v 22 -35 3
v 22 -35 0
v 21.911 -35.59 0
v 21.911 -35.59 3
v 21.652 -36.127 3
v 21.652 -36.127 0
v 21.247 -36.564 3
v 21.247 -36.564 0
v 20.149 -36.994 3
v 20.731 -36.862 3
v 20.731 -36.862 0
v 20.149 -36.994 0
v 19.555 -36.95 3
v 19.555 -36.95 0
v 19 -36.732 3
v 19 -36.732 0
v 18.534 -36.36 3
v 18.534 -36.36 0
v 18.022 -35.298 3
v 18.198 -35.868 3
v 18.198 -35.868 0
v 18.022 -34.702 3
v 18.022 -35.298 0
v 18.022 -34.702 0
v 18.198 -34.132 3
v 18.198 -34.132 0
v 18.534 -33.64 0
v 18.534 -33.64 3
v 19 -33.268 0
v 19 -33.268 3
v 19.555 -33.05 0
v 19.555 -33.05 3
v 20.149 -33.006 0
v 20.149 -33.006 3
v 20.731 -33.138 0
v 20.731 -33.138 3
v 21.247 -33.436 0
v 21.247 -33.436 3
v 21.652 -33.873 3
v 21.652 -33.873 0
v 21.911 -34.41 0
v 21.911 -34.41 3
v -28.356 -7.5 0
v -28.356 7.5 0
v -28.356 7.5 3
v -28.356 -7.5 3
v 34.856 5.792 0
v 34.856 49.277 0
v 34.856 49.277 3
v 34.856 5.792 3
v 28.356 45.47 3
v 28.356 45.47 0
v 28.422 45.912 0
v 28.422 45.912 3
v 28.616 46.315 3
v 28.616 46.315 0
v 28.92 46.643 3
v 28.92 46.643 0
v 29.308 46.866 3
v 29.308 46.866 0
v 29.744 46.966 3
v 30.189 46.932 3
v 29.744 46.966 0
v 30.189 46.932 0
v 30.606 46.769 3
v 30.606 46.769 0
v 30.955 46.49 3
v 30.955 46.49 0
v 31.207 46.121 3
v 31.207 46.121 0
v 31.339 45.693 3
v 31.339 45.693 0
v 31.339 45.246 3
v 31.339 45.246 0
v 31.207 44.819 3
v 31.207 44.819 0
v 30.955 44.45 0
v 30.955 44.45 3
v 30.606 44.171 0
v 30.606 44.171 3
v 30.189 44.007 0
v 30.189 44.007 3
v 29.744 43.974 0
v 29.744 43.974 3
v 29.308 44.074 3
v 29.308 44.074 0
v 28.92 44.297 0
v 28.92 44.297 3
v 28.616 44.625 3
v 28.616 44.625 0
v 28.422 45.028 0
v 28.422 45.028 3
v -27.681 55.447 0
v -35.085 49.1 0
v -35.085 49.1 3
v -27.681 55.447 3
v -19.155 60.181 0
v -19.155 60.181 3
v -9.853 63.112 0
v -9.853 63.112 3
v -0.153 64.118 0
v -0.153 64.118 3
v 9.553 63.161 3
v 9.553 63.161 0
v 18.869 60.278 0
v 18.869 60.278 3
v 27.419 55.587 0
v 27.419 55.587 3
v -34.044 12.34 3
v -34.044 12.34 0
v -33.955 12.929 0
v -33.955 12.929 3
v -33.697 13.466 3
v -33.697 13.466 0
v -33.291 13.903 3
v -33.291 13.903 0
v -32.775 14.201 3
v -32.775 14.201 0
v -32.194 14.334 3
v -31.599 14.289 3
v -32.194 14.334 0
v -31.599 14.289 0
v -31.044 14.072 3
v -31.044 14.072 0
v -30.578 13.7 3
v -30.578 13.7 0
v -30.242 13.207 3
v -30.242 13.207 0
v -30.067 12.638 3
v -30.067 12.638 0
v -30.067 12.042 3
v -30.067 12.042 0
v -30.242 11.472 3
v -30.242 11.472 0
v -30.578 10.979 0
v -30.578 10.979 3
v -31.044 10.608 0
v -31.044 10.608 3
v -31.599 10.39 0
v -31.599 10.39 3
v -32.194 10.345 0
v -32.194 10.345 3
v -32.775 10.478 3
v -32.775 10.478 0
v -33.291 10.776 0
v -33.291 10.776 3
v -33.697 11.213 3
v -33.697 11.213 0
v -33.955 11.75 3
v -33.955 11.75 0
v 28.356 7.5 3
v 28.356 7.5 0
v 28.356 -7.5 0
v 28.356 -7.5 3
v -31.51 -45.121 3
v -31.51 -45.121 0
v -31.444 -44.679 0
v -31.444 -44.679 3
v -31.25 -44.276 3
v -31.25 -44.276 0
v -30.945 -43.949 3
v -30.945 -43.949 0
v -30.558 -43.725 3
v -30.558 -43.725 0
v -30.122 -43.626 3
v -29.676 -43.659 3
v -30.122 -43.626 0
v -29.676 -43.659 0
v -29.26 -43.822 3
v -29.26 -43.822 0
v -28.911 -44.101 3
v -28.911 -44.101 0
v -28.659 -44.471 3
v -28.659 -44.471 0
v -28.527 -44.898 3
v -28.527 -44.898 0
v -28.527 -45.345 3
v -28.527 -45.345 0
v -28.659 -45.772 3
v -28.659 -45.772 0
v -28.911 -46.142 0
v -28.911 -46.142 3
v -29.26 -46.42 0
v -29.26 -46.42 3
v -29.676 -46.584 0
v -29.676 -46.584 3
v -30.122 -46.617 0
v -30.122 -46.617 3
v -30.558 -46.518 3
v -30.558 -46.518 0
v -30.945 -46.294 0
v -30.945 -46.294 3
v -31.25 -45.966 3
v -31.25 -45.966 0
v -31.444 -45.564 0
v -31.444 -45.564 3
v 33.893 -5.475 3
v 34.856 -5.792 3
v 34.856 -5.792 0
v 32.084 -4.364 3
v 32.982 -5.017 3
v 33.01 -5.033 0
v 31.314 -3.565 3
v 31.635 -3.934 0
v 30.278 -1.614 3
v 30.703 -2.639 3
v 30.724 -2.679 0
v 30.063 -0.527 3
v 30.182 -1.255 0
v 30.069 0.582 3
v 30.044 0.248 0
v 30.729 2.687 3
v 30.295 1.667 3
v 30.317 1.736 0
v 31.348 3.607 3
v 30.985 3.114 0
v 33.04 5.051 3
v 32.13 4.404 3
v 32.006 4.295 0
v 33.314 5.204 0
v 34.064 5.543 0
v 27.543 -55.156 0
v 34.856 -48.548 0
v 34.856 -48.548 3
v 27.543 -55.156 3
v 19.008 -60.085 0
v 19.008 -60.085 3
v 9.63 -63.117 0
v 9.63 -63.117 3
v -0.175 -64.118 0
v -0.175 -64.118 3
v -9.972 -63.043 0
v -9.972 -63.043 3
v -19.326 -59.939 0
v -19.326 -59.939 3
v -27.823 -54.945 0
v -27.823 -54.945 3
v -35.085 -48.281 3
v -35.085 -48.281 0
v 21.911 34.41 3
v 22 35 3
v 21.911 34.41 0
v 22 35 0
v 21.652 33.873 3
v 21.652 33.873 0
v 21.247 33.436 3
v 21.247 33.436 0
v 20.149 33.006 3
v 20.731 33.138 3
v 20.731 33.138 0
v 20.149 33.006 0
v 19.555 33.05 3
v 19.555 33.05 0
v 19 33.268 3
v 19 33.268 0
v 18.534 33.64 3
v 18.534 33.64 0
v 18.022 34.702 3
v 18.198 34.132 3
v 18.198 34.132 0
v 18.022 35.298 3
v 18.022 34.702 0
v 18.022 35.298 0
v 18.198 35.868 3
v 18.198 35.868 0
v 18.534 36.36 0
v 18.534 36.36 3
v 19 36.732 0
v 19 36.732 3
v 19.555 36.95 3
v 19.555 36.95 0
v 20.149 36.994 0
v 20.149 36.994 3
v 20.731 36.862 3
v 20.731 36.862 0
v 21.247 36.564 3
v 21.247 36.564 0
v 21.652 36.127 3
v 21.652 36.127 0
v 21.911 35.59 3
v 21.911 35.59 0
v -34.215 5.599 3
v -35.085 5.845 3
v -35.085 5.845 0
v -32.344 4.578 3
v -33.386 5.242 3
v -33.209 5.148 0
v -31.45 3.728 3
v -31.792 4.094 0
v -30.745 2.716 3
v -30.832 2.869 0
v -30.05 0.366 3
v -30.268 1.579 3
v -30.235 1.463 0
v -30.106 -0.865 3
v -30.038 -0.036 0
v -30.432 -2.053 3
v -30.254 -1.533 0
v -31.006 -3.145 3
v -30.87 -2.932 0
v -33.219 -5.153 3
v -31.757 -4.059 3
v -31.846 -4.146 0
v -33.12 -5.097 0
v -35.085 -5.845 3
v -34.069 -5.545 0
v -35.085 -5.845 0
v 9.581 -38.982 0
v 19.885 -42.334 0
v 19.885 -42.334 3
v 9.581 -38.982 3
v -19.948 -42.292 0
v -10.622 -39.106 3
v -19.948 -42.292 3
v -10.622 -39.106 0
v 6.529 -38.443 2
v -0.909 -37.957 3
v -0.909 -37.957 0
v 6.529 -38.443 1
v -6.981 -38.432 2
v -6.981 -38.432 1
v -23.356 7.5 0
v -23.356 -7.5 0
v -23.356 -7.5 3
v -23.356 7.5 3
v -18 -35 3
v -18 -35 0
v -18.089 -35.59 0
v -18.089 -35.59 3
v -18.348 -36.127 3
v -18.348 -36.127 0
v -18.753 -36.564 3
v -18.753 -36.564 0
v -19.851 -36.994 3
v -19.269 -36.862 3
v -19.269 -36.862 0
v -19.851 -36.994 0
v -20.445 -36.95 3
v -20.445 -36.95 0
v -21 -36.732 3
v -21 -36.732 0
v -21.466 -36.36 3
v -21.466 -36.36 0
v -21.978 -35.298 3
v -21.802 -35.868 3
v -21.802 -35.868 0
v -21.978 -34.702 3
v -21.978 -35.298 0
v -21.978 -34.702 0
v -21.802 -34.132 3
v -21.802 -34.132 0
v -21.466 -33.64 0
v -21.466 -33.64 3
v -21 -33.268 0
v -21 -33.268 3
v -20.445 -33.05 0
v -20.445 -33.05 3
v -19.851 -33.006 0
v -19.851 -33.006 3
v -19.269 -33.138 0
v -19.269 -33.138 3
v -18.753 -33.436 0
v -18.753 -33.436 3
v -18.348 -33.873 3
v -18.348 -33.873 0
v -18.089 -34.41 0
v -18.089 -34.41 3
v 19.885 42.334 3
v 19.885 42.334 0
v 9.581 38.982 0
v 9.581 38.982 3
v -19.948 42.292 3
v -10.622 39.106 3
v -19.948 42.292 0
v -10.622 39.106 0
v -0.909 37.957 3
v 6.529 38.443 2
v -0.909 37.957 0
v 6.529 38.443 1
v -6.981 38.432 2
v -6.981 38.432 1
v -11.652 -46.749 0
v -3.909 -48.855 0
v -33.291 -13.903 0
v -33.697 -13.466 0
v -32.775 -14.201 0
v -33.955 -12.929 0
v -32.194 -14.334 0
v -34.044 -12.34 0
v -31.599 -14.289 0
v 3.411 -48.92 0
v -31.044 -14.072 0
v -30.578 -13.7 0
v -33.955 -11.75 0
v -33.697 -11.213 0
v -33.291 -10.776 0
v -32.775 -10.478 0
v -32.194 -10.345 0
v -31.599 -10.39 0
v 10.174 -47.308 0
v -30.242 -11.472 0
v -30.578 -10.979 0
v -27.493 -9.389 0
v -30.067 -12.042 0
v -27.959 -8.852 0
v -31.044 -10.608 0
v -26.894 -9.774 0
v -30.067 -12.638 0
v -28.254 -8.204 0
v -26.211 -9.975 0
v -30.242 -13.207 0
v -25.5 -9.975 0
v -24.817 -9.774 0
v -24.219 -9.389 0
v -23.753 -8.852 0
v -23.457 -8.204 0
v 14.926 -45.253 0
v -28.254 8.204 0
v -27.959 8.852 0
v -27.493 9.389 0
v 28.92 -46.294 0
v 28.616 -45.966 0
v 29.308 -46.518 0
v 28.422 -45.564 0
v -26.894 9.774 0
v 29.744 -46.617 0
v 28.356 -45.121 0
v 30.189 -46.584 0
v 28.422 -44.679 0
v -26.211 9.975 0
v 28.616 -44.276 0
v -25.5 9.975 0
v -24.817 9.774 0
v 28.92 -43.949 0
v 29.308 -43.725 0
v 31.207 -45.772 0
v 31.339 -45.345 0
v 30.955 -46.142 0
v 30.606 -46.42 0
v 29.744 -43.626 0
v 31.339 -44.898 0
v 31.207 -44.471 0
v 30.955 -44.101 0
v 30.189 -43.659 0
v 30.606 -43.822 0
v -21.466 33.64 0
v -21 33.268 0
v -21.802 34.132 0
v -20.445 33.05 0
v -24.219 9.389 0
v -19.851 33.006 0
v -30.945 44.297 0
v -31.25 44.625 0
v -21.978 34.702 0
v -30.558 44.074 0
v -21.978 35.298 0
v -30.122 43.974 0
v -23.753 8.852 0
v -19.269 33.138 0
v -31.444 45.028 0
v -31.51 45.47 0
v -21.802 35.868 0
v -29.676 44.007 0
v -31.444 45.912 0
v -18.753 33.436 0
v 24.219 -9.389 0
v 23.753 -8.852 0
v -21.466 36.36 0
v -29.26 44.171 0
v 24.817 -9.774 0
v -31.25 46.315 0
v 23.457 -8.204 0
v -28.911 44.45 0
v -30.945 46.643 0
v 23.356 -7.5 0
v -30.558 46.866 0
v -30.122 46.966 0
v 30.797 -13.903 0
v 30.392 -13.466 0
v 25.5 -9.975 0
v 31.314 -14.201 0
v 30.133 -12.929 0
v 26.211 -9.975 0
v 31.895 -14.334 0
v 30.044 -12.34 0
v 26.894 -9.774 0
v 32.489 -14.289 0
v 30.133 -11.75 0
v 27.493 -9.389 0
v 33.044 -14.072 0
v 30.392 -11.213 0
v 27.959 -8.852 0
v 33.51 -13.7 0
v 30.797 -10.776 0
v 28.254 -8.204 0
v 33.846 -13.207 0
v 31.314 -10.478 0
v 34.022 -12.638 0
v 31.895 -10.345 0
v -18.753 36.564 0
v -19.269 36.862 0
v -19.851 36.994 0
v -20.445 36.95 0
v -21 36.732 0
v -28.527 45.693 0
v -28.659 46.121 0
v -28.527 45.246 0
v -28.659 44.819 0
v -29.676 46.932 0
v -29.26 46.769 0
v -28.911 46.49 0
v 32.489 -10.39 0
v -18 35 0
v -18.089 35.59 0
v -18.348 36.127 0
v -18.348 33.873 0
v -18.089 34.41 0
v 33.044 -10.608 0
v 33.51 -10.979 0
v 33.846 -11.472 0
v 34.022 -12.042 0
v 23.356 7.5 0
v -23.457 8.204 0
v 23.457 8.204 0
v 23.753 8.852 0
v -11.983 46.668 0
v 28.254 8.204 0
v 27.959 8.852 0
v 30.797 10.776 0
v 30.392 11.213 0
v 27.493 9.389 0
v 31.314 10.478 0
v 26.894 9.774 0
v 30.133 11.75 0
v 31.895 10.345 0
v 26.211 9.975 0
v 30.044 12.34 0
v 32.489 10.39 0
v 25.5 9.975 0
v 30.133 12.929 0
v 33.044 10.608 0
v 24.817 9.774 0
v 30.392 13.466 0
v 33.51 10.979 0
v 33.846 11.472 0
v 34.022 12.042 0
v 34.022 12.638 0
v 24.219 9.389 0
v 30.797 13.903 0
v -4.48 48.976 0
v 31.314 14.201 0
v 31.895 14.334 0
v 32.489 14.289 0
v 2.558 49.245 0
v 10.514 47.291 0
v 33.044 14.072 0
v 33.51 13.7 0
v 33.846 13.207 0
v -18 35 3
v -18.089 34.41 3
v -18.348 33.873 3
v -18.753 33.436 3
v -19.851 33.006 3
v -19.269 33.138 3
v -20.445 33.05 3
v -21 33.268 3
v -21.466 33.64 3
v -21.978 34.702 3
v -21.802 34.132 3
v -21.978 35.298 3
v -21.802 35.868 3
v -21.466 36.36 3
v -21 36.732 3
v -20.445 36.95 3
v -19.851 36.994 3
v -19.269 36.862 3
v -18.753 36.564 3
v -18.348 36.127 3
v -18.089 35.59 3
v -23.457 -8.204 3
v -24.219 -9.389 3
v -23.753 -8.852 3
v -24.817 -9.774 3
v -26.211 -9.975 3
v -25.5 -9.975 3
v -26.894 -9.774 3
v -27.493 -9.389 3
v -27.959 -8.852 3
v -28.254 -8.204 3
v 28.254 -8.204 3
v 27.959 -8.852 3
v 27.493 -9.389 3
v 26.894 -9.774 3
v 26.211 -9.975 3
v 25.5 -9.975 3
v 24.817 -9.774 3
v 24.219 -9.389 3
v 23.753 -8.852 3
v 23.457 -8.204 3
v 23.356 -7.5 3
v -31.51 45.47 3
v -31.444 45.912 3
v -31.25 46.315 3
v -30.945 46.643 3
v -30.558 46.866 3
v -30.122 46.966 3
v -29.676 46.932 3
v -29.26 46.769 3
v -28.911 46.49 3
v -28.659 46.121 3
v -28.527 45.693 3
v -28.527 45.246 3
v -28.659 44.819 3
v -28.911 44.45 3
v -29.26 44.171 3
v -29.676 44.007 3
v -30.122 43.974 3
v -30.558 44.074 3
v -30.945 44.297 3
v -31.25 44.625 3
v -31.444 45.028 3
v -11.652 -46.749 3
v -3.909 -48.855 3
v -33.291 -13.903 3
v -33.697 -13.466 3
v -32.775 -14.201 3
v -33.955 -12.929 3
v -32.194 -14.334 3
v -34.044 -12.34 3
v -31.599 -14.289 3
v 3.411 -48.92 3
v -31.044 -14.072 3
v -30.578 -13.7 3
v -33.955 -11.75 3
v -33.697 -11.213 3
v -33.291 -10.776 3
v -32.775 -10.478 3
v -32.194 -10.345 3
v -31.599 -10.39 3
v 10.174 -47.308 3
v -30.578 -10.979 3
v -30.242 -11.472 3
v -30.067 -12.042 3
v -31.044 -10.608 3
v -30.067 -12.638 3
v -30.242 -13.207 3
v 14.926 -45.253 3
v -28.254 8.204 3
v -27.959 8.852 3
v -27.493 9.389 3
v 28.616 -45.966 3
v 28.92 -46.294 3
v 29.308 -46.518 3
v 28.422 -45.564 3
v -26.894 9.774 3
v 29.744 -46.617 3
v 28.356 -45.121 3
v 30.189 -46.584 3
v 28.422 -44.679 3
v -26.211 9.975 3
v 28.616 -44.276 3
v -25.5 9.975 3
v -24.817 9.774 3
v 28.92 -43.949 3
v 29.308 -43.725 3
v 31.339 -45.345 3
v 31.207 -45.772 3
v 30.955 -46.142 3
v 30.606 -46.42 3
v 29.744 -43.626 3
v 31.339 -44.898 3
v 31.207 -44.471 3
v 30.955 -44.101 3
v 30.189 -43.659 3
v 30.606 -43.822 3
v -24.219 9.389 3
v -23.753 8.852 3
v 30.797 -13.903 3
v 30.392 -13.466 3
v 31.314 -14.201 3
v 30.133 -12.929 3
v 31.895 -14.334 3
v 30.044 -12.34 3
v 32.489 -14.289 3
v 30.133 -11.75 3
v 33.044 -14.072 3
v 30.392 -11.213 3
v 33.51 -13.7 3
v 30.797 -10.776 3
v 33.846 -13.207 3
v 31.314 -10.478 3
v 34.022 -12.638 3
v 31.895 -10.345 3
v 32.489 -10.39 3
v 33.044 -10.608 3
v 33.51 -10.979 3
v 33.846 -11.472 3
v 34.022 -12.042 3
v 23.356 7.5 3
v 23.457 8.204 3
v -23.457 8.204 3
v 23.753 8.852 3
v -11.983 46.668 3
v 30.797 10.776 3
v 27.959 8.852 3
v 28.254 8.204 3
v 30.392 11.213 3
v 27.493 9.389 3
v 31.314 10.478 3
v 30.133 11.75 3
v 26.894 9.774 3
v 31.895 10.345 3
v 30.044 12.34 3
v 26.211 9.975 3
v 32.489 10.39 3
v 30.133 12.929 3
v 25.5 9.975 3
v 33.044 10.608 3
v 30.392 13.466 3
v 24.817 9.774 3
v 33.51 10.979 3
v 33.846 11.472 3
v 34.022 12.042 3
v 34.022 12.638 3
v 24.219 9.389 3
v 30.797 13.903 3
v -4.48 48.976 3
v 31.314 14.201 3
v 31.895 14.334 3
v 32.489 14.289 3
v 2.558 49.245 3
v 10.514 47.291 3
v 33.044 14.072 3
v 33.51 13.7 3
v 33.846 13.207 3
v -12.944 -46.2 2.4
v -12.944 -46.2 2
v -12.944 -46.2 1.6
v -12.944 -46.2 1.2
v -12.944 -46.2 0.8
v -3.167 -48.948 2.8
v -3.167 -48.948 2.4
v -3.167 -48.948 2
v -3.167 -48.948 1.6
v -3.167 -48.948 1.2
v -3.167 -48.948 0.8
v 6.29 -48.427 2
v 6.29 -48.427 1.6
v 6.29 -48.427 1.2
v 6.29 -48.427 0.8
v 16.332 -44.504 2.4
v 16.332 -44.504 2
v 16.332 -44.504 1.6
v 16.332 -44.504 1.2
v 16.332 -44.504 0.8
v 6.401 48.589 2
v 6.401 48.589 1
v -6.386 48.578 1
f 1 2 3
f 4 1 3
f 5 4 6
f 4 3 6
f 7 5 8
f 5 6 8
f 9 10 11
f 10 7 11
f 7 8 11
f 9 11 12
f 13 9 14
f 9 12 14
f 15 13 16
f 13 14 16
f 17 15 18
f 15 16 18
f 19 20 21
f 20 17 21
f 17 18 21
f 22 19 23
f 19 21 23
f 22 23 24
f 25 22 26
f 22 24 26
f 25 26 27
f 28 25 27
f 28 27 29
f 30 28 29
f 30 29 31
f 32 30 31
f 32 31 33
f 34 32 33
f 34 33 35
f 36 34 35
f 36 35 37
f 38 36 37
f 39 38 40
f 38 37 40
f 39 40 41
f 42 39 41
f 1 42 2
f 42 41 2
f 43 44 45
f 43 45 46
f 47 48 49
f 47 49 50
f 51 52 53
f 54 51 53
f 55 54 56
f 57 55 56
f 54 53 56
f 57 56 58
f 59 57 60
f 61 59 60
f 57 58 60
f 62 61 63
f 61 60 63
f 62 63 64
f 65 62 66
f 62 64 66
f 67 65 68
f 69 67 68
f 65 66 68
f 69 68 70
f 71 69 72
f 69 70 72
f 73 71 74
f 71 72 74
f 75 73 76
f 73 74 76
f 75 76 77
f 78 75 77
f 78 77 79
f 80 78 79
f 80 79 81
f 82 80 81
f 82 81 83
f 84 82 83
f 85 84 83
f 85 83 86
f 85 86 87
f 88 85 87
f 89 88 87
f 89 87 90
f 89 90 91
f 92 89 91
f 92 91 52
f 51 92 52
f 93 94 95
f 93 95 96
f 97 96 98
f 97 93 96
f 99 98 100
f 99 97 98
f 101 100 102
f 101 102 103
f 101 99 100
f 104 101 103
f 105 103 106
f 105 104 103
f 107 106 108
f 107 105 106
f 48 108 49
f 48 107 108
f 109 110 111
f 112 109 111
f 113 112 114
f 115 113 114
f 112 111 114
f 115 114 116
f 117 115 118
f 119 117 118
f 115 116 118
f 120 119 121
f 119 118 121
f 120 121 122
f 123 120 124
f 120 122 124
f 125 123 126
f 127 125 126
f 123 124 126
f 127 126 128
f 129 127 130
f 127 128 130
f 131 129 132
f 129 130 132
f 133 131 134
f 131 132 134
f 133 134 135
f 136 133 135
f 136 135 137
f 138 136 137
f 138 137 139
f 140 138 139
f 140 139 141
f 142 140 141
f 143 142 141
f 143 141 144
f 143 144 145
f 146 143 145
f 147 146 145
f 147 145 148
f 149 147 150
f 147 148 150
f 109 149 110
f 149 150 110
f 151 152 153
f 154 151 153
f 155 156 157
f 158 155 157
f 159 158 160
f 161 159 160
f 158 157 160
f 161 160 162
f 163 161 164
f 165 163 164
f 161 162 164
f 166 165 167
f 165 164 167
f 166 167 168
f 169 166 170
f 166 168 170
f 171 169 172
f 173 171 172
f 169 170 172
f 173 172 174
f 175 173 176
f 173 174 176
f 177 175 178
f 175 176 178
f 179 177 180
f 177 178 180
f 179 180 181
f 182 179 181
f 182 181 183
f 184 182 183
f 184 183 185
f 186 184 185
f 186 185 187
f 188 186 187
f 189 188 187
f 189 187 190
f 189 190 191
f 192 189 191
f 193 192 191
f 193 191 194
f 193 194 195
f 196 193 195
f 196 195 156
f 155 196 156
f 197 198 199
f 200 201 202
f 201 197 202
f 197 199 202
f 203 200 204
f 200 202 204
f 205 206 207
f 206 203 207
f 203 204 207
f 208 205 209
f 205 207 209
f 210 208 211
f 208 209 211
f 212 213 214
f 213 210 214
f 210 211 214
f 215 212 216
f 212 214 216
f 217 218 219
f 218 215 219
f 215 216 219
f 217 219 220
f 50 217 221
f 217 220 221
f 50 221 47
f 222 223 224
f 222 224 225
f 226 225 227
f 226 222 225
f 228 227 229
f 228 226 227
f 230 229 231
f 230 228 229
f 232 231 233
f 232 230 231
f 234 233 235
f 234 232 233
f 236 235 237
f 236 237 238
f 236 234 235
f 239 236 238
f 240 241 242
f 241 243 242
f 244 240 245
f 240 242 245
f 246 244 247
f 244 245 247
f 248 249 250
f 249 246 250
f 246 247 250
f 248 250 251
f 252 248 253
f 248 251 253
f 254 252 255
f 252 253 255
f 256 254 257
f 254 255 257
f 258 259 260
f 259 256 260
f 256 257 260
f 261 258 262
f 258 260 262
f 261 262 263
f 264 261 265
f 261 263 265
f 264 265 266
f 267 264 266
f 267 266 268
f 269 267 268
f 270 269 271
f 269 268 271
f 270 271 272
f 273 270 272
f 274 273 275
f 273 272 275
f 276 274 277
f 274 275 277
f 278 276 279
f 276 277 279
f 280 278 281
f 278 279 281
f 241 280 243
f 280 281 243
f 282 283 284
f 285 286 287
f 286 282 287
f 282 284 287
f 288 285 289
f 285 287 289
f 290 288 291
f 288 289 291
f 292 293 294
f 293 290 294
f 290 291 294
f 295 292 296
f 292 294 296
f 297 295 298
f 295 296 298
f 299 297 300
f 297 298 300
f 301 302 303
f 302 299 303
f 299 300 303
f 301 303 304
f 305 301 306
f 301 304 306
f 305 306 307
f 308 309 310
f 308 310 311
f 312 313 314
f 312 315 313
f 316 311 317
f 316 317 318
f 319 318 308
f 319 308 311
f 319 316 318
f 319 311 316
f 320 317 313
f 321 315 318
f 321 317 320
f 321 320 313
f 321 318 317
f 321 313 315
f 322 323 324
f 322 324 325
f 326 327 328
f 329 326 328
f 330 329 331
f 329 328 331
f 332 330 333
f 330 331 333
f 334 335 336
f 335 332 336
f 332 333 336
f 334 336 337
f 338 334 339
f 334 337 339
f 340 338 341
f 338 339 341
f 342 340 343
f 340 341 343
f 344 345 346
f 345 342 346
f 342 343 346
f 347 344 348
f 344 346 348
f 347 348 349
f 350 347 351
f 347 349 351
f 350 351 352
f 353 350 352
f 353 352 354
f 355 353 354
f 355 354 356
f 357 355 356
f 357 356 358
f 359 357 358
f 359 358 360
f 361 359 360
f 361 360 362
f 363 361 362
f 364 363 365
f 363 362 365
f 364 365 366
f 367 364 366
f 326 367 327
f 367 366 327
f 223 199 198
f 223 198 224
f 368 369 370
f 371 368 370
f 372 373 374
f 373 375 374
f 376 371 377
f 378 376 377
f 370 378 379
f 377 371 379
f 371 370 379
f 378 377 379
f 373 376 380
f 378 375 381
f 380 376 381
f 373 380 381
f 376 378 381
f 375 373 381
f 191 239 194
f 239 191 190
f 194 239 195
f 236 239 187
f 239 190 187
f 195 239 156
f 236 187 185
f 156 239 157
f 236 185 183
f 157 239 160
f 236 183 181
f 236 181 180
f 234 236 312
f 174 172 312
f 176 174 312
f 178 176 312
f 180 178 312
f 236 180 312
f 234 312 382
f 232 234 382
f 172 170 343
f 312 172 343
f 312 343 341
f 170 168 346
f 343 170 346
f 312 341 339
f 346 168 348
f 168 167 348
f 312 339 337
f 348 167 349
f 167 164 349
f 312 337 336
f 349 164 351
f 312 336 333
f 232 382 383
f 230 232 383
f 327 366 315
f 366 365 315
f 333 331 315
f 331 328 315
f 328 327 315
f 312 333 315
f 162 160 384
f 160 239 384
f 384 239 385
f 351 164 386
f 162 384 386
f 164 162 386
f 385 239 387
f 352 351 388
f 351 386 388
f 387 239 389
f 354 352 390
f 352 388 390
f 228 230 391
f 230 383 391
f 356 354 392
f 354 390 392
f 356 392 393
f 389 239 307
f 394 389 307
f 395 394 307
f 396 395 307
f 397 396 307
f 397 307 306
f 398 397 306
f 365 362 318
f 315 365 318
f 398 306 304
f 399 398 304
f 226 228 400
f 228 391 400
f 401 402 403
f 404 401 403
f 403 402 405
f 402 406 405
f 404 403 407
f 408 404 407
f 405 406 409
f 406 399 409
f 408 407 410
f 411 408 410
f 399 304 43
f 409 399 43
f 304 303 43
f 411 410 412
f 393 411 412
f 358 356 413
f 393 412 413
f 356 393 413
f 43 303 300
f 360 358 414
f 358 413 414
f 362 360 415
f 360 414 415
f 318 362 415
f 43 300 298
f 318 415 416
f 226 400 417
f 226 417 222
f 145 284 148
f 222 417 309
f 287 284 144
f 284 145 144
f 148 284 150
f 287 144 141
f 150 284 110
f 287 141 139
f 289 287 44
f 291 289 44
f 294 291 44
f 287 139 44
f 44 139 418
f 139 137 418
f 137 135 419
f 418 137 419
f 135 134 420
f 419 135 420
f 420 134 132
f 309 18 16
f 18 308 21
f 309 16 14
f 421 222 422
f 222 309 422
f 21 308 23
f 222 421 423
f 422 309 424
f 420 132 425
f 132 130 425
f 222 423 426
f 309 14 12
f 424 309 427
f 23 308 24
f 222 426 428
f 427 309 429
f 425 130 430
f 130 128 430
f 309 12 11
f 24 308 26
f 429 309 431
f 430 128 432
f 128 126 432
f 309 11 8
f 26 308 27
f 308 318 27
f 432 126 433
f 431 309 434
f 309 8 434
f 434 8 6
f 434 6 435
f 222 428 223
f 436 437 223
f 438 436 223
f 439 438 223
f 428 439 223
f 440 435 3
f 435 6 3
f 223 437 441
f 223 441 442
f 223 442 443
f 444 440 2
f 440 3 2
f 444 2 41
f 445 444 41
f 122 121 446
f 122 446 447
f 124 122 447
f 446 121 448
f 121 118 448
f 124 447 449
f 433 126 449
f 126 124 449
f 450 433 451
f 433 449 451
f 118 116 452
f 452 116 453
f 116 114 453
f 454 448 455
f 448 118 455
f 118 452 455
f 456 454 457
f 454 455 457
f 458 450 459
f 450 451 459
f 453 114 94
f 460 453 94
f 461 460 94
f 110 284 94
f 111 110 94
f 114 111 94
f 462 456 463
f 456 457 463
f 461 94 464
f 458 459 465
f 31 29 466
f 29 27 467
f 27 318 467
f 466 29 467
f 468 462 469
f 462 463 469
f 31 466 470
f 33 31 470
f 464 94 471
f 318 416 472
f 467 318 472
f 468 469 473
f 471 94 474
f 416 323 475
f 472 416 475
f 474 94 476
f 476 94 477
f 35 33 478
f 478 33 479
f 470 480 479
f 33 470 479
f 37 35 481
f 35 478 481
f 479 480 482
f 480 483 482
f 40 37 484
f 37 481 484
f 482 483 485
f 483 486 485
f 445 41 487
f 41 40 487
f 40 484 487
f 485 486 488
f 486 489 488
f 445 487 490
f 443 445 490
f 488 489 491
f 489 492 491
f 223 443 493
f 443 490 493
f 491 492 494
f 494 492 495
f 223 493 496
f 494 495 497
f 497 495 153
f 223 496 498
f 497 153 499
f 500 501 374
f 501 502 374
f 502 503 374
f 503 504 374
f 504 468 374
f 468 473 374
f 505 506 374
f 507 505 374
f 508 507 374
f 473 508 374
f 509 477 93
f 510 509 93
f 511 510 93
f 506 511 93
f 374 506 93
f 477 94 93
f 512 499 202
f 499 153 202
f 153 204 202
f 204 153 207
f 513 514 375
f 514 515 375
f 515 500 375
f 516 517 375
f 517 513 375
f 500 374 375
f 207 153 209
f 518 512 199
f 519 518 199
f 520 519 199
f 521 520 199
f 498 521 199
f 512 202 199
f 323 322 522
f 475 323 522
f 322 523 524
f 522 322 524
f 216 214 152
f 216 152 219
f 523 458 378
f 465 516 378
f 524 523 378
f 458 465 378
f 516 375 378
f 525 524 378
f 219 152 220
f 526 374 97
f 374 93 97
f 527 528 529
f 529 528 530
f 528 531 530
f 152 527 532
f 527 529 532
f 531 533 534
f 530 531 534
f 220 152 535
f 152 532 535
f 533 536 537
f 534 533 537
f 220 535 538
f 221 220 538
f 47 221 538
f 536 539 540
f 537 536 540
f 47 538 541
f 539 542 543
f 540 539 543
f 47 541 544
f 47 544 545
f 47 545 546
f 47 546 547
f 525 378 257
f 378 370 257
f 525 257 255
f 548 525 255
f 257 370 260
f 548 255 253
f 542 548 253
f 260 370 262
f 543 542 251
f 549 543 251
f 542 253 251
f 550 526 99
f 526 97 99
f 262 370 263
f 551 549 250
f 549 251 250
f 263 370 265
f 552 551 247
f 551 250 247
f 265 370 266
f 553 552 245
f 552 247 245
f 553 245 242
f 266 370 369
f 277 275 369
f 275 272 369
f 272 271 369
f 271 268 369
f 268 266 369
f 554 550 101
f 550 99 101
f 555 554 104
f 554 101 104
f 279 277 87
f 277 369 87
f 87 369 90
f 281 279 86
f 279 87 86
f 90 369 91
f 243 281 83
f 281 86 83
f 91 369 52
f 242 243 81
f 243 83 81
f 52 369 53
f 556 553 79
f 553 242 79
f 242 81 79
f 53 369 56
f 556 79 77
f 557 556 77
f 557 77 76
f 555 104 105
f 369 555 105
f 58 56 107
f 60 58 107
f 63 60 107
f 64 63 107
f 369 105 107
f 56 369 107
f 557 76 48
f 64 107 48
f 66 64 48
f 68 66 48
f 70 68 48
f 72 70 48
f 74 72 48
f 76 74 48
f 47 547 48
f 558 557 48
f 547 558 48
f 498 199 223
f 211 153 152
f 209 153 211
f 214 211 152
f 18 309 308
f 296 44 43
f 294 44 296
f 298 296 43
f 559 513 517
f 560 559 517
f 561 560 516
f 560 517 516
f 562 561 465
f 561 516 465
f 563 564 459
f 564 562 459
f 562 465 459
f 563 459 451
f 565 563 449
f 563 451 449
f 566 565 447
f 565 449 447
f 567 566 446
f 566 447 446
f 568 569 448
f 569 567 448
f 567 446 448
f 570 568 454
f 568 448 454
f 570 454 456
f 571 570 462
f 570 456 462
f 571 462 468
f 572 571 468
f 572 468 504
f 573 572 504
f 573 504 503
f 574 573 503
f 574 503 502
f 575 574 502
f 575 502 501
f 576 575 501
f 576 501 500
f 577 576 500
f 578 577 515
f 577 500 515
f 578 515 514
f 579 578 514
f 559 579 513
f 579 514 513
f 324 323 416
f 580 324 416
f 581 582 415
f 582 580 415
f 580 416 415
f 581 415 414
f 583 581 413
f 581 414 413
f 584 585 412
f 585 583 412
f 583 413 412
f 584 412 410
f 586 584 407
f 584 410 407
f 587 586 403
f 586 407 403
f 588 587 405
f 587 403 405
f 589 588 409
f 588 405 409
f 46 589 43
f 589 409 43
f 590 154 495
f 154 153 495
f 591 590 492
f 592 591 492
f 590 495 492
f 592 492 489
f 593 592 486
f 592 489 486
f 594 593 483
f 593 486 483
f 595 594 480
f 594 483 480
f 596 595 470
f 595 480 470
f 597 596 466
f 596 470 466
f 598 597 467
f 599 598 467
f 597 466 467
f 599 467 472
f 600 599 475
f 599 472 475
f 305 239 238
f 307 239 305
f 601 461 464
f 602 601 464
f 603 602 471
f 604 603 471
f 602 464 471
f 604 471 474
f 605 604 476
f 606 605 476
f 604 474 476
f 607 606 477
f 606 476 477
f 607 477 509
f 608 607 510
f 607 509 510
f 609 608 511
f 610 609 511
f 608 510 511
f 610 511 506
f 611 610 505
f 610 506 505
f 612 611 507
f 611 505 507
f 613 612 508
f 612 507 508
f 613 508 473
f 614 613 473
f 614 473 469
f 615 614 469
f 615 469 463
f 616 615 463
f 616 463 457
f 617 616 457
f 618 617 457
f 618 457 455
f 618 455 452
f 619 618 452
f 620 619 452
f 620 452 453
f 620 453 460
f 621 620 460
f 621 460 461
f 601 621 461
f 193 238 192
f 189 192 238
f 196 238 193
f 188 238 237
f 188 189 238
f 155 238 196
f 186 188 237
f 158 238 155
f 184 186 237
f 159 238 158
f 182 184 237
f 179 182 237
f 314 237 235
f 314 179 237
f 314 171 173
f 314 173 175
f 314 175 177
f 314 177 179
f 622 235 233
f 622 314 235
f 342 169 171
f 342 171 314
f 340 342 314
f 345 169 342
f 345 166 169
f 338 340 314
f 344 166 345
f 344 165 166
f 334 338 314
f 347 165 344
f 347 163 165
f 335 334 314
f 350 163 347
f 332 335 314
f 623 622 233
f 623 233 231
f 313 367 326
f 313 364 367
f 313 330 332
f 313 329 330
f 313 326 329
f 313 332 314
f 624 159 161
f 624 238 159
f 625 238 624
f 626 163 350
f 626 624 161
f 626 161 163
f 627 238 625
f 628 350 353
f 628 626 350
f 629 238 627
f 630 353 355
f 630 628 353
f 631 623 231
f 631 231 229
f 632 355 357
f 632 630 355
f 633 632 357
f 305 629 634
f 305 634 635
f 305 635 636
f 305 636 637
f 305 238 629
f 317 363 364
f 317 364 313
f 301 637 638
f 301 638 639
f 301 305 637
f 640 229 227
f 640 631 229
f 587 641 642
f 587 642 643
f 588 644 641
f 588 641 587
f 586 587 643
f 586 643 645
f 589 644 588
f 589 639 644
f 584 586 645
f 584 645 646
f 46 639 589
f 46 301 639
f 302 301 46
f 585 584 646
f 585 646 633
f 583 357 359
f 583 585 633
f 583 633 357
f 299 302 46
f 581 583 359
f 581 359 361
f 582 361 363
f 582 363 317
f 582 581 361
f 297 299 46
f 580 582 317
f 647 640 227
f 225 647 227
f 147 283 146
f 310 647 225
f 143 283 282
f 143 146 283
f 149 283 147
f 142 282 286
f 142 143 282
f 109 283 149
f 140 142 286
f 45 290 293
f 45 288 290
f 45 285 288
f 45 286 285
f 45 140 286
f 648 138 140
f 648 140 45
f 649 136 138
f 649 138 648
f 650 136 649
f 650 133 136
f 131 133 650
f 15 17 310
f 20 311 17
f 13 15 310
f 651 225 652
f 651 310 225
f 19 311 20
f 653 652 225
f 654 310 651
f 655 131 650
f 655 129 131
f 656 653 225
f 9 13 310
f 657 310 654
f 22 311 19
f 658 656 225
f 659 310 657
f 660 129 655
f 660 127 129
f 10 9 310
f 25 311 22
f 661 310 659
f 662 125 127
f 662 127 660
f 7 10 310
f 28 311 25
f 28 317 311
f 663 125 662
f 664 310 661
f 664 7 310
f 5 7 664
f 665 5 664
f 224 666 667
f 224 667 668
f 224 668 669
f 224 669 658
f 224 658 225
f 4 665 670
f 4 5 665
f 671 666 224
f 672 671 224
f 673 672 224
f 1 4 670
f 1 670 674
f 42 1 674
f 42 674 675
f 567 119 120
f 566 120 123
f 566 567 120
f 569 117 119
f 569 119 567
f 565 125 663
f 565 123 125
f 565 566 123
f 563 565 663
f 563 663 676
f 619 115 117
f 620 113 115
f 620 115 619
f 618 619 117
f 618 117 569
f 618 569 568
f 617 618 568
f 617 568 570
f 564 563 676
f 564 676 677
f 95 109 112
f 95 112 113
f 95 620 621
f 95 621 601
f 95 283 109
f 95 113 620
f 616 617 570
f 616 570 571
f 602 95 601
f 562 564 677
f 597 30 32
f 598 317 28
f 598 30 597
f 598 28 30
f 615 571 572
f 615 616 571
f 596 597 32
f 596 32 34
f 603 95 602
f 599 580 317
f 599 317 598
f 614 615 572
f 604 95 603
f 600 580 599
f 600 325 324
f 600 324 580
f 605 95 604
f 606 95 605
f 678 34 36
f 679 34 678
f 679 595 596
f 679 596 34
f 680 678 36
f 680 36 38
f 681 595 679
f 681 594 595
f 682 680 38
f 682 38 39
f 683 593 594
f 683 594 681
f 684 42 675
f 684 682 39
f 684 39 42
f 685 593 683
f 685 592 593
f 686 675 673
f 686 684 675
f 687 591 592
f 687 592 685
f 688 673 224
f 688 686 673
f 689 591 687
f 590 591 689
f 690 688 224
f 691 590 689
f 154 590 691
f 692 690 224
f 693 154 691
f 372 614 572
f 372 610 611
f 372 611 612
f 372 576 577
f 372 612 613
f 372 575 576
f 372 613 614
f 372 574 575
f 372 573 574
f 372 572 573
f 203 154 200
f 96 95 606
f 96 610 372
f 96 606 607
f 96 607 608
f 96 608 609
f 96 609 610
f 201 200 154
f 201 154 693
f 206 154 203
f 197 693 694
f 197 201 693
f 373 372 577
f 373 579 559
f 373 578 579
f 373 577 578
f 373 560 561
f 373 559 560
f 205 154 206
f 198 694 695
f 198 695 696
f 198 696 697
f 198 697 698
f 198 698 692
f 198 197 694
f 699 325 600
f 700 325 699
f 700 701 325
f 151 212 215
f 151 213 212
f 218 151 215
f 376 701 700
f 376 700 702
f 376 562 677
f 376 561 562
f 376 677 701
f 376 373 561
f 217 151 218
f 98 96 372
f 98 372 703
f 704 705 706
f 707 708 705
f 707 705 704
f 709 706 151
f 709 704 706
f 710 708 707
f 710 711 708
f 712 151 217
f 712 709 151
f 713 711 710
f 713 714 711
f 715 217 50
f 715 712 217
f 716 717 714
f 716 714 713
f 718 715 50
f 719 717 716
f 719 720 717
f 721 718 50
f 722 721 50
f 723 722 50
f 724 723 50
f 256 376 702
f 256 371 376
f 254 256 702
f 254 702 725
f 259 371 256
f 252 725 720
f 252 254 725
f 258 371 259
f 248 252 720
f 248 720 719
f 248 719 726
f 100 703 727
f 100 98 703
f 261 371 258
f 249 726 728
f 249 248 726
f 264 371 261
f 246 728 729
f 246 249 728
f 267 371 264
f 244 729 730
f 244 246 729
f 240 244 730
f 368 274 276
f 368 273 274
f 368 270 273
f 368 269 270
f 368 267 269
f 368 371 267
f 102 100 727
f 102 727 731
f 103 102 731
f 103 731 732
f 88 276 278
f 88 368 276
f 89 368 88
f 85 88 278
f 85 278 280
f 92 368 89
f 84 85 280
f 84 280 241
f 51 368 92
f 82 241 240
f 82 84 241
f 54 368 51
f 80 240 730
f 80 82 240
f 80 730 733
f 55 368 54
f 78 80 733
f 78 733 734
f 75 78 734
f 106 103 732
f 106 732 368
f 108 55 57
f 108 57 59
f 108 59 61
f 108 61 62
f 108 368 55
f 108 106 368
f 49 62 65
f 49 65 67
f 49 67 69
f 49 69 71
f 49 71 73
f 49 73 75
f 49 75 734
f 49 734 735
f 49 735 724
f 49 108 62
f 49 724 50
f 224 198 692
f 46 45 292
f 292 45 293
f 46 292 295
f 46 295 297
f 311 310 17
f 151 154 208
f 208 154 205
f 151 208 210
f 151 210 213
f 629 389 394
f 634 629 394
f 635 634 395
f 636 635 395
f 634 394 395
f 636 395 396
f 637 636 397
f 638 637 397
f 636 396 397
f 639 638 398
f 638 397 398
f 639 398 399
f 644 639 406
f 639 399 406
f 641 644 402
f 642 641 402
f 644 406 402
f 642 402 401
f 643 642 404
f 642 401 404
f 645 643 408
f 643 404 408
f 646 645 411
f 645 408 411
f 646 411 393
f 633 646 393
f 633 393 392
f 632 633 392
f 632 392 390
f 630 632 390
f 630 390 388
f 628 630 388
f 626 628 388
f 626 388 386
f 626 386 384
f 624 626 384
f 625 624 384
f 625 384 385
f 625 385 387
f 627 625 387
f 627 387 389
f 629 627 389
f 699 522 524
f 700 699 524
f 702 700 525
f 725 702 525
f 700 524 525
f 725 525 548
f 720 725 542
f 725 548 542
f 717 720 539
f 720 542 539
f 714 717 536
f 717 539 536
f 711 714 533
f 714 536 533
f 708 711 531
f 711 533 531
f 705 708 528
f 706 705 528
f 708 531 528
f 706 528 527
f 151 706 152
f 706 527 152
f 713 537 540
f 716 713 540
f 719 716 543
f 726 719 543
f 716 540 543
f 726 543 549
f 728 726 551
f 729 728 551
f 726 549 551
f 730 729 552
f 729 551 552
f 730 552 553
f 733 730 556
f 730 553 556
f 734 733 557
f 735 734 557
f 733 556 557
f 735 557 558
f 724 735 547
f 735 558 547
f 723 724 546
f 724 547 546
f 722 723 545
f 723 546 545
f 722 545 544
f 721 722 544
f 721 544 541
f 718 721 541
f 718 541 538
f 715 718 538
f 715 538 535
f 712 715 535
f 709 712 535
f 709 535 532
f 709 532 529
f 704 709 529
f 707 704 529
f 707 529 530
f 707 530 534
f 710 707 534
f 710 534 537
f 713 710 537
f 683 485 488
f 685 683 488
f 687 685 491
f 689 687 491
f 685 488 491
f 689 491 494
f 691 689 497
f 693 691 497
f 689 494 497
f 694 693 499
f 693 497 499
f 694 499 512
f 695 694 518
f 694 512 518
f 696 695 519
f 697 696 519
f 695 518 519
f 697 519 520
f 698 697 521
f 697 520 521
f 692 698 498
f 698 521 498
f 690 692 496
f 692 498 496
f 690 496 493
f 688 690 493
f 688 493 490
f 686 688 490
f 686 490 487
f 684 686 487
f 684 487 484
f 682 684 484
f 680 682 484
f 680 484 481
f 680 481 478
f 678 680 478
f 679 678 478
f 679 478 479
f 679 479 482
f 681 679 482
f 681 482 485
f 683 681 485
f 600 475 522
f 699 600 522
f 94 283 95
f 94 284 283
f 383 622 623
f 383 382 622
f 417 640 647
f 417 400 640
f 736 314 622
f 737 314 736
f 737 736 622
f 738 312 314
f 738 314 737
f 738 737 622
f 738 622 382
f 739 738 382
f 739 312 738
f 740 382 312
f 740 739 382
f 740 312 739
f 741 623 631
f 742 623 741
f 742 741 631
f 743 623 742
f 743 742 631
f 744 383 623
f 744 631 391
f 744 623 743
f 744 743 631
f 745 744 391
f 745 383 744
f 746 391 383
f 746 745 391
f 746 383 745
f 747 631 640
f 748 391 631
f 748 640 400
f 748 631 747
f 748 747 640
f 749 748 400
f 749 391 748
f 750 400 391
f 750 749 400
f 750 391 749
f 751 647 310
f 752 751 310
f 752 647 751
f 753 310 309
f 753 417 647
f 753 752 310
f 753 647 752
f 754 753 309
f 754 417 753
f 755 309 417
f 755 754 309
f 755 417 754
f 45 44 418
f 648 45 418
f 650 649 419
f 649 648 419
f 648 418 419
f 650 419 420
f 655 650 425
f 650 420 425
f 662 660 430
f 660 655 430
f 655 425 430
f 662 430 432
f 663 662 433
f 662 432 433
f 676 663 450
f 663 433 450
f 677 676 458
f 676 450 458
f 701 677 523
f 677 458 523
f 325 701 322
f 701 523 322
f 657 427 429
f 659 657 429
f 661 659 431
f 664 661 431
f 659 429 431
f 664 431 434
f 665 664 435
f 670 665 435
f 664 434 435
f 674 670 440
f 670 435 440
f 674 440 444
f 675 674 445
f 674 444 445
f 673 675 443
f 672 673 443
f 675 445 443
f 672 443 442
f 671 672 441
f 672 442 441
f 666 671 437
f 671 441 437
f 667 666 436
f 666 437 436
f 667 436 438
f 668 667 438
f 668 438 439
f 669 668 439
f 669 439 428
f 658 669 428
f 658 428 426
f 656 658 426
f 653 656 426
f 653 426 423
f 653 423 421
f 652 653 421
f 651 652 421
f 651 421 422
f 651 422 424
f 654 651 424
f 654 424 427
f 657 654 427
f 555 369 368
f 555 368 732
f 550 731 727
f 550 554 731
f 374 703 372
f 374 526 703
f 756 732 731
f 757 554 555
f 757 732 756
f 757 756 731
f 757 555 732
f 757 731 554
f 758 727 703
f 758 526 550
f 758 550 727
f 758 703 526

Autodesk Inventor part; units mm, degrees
ref_plane "YZ Plane" through (0, 0, 0) normal (1, 0, 0) x (0, 1, 0)
ref_plane "XZ Plane" through (0, 0, 0) normal (0, 1, 0) x (-1, 0, 0)
ref_plane "XY Plane" through (0, 0, 0) normal (0, 0, 1) x (1, 0, 0)
ref_plane "Płaszczyzna konstrukcyjna1" through (0, 0, 0) normal (0, 0, 1) x (1, 0, 0)
sketch "Szkic1" plane through (0, 0, 0) normal (0, 0, 1) x (1, 0, 0)
  line L0 (-16.5, -47.5) -> (-16.5, 50.5) construction
  line L1 (16.5, -47.5) -> (-16.5, -47.5)
  line L2 (16.5, 50.5) -> (16.5, -47.5) construction
  line L3 (-16.5, 50.5) -> (16.5, 50.5)
  spline S0 degree 3 poles (-35.085094, 0.350302) (-65.123445, -45.85666) (-107.677174, -89.186977) (-160.871239, -134.245964) (-163.540213, -136.506767) (-166.235706, -138.77176) (-168.958028, -141.042) knots 1.00684263 1.00684263 1.00684263 1.00684263 1.95254981 1.95254981 1.95254981 2 2 2 2 construction
  spline S1 degree 3 poles (-168.958035, -141.042006) (-174.842969, -145.949681) (-180.021392, -152.120463) (-183.430993, -158.400223) (-185.92467, -162.993046) (-187.5096, -167.629248) (-187.777285, -172.0593) (-187.941661, -174.779633) (-187.597345, -177.457906) (-186.533873, -179.887417) (-185.566044, -182.098431) (-183.960403, -184.06029) (-181.944828, -185.409391) (-179.841126, -186.817479) (-177.370046, -187.557326) (-174.842104, -187.757319) (-170.645821, -188.089298) (-166.2165, -187.039461) (-161.759498, -185.081578) (-154.903003, -182.06964) (-147.956172, -176.775816) (-142.375954, -170.505914) (-141.930799, -170.005741) (-141.494091, -169.499252) (-141.067481, -168.988346) knots -1.74995257 -1.74995257 -1.74995257 -1.74995257 -1.03595782 -1.03595782 -1.03595782 -0.51376401 -0.51376401 -0.51376401 -0.19310387 -0.19310387 -0.19310387 0.09871784 0.09871784 0.09871784 0.4032988 0.4032988 0.4032988 0.90889088 0.90889088 0.90889088 1.68667586 1.68667586 1.68667586 1.74872267 1.74872267 1.74872267 1.74872267
  spline S2 degree 3 poles (-141.067481, -168.988346) (-116.712468, -140.68912) (-93.293894, -114.867026) (-73.367362, -94.342192) (-61.6586, -82.28187) (-51.151132, -72.048223) (-42.412496, -64.246161) (-37.627468, -59.973975) (-33.366948, -56.428021) (-29.779492, -53.735847) knots 1.1712815 1.1712815 1.1712815 1.1712815 1.58557053 1.58557053 1.58557053 1.82900535 1.82900535 1.82900535 1.96230333 1.96230333 1.96230333 1.96230333
  spline S3 degree 3 poles (-29.779492, -53.735847) (-23.002213, -58.511561) (-16.053637, -61.720133) (-8.95639, -63.196051) (-1.235829, -64.801593) (6.619932, -64.303417) (14.26492, -61.76241) (19.532027, -60.011752) (24.701042, -57.314346) (29.778619, -53.736463) knots 1.04774904 1.04774904 1.04774904 1.04774904 1.36653444 1.36653444 1.36653444 1.71331713 1.71331713 1.71331713 1.95223726 1.95223726 1.95223726 1.95223726
  spline S4 degree 3 poles (29.778619, -53.736463) (34.571432, -57.320947) (40.566429, -62.365096) (47.432495, -68.614281) (65.987099, -85.501849) (90.98262, -111.228833) (117.881656, -141.881406) (125.48107, -150.541255) (133.234406, -159.595591) (141.042009, -168.957931) knots 1.23044004 1.23044004 1.23044004 1.23044004 1.40276207 1.40276207 1.40276207 1.86843878 1.86843878 1.86843878 2 2 2 2
  spline S5 degree 3 poles (141.042009, -168.957931) (145.94969, -174.842884) (152.120487, -180.021325) (158.400263, -183.430935) (162.993086, -185.924612) (167.629288, -187.509541) (172.05934, -187.777227) (174.779673, -187.941603) (177.457946, -187.597287) (179.887458, -186.533815) (182.098472, -185.565985) (184.06033, -183.960345) (185.409431, -181.94477) (186.817519, -179.841068) (187.557366, -177.369988) (187.757359, -174.842045) (188.089339, -170.645763) (187.039501, -166.216442) (185.081618, -161.75944) (182.069681, -154.902945) (176.775856, -147.956114) (170.505954, -142.375896) (169.995852, -141.921904) (169.479183, -141.4767) (168.957931, -141.042009) knots -1.7499544 -1.7499544 -1.7499544 -1.7499544 -1.03595782 -1.03595782 -1.03595782 -0.51376401 -0.51376401 -0.51376401 -0.19310387 -0.19310387 -0.19310387 0.09871784 0.09871784 0.09871784 0.4032988 0.4032988 0.4032988 0.90889088 0.90889088 0.90889088 1.68667586 1.68667586 1.68667586 1.7499544 1.7499544 1.7499544 1.7499544
  spline S6 degree 3 poles (168.957931, -141.042009) (111.993228, -93.537028) (66.637529, -48.185561) (34.855669, -0.000058) knots 1 1 1 1 1.99296801 1.99296801 1.99296801 1.99296801 construction
  spline S7 degree 3 poles (34.855669, -0.000058) (66.637377, 48.185408) (111.993133, 93.536948) (168.957931, 141.042009) knots 1.00703033 1.00703033 1.00703033 1.00703033 2 2 2 2 construction
  spline S8 degree 3 poles (168.957931, 141.042009) (174.842884, 145.94969) (180.021325, 152.120487) (183.430935, 158.400263) (185.924612, 162.993086) (187.509541, 167.629288) (187.777227, 172.05934) (187.941603, 174.779673) (187.597287, 177.457946) (186.533815, 179.887458) (185.565985, 182.098472) (183.960345, 184.06033) (181.94477, 185.409431) (179.841068, 186.817519) (177.369988, 187.557366) (174.842045, 187.757359) (170.645763, 188.089339) (166.216442, 187.039501) (161.75944, 185.081618) (154.902945, 182.069681) (147.956114, 176.775856) (142.375896, 170.505954) (141.93073, 170.005769) (141.494012, 169.499268) (141.067392, 168.98835) knots -1.7499544 -1.7499544 -1.7499544 -1.7499544 -1.03595782 -1.03595782 -1.03595782 -0.51376401 -0.51376401 -0.51376401 -0.19310387 -0.19310387 -0.19310387 0.09871784 0.09871784 0.09871784 0.4032988 0.4032988 0.4032988 0.90889088 0.90889088 0.90889088 1.68667586 1.68667586 1.68667586 1.74872416 1.74872416 1.74872416 1.74872416 construction
  spline S9 degree 3 poles (141.067392, 168.98835) (116.712447, 140.689096) (93.29391, 114.86699) (73.367396, 94.342151) (61.658634, 82.281814) (51.151162, 72.048159) (42.412523, 64.246094) (37.627506, 59.973916) (33.366993, 56.427969) (29.779541, 53.7358) knots 1.17128149 1.17128149 1.17128149 1.17128149 1.58557053 1.58557053 1.58557053 1.82900558 1.82900558 1.82900558 1.96230334 1.96230334 1.96230334 1.96230334 construction
  spline S10 degree 3 poles (29.779541, 53.7358) (23.00225, 58.511525) (16.053664, 61.720107) (8.956408, 63.196032) (1.235842, 64.80158) (-6.619923, 64.30341) (-14.264913, 61.762407) (-19.532023, 60.011751) (-24.70104, 57.314346) (-29.778619, 53.736463) knots 1.04774897 1.04774897 1.04774897 1.04774897 1.36653452 1.36653452 1.36653452 1.71331713 1.71331713 1.71331713 1.95223726 1.95223726 1.95223726 1.95223726
  spline S11 degree 3 poles (-29.778619, 53.736463) (-34.571432, 57.320947) (-40.566429, 62.365096) (-47.432495, 68.614281) (-65.987099, 85.501849) (-90.98262, 111.228833) (-117.881656, 141.881406) (-125.48107, 150.541255) (-133.234406, 159.595591) (-141.042009, 168.957931) knots 1.23044004 1.23044004 1.23044004 1.23044004 1.40276207 1.40276207 1.40276207 1.86843878 1.86843878 1.86843878 2 2 2 2 construction
  spline S12 degree 3 poles (-141.042009, 168.957931) (-145.94969, 174.842884) (-152.120487, 180.021325) (-158.400263, 183.430935) (-162.993086, 185.924612) (-167.629288, 187.509541) (-172.05934, 187.777227) (-174.779673, 187.941603) (-177.457946, 187.597287) (-179.887458, 186.533815) (-182.098472, 185.565985) (-184.06033, 183.960345) (-185.409431, 181.94477) (-186.817519, 179.841068) (-187.557366, 177.369988) (-187.757359, 174.842045) (-188.089339, 170.645763) (-187.039501, 166.216442) (-185.081618, 161.75944) (-182.069681, 154.902945) (-176.775856, 147.956114) (-170.505954, 142.375896) (-169.995852, 141.921904) (-169.479183, 141.4767) (-168.957931, 141.042009) knots -1.7499544 -1.7499544 -1.7499544 -1.7499544 -1.03595782 -1.03595782 -1.03595782 -0.51376401 -0.51376401 -0.51376401 -0.19310387 -0.19310387 -0.19310387 0.09871784 0.09871784 0.09871784 0.4032988 0.4032988 0.4032988 0.90889088 0.90889088 0.90889088 1.68667586 1.68667586 1.68667586 1.7499544 1.7499544 1.7499544 1.7499544
  spline S13 degree 3 poles (-168.957931, 141.042009) (-111.993306, 93.537093) (-66.634651, 48.181164) (-35.085094, 0.350302) knots 1 1 1 1 1.99296665 1.99296665 1.99296665 1.99296665 construction
  spline S14 degree 3 poles (15.08474, 32.081826) (13.142615, 27.920021) (11.206834, 23.755267) (7.347081, 15.418016) (5.423125, 11.245533) (3.50551, 7.070128) knots 0 0 0 0 1.37779618 1.37779618 2.75620579 2.75620579 2.75620579 2.75620579 construction
  arc A0 (3.50551, 7.070128) -> (-3.550162, 7.111441) centre (-0.064535, -0.117868) ccw
  spline S15 degree 3 poles (-3.550162, 7.111441) (-5.476159, 11.293082) (-7.408923, 15.471593) (-11.287085, 23.820373) (-13.232467, 27.990624) (-15.184617, 32.157717) knots 0 0 0 0 1.38115979 1.38115979 2.76166682 2.76166682 2.76166682 2.76166682 construction
  spline S16 degree 3 poles (-15.184617, 32.157717) (-14.754715, 32.524347) (-14.315487, 32.879522) (-13.401907, 33.58056) (-12.927392, 33.92514) (-12.444135, 34.257559) knots 0 0 0 0 0.49064646 0.49064646 1 1 1 1
  spline S17 degree 3 poles (-12.444135, 34.257559) (-9.857516, 31.263166) (-7.370332, 28.095019) (-3.226905, 21.915373) (-1.464317, 18.86972) (-0.029639, 15.697104) knots 0 0 0 0 1.18706736 1.18706736 2.2295227 2.2295227 2.2295227 2.2295227
  spline S18 degree 3 poles (-0.029639, 15.697104) (1.394779, 18.864276) (3.146428, 21.904712) (7.267313, 28.073431) (9.741557, 31.234617) (12.316482, 34.222704) knots 0 0 0 0 1.04182291 1.04182291 2.22753004 2.22753004 2.22753004 2.22753004
  spline S19 degree 3 poles (12.316482, 34.222704) (12.805198, 33.884055) (13.28481, 33.532857) (14.207654, 32.81808) (14.651041, 32.455846) (15.08474, 32.081826) knots 0 0 0 0 0.50937249 0.50937249 1 1 1 1
  spline S20 degree 3 poles (-19.948357, 42.291714) (-14.639949, 45.838264) (-9.990985, 47.660697) (-2.091787, 49.301941) (1.677222, 49.331262) (9.761575, 47.76592) (14.518581, 45.908732) (19.884685, 42.334177) knots 0 0 0 0 1.91524131 1.91524131 3.69438874 3.69438874 5.68840016 5.68840016 5.68840016 5.68840016 construction
  spline S21 degree 3 poles (19.884685, 42.334177) (13.583668, 39.654933) (6.996486, 38.105537) (-3.242366, 38.040322) (-6.597665, 38.388751) (-13.364764, 39.812974) (-16.709843, 40.903142) (-19.948357, 42.291714) knots 0 0 0 0 2.05409443 2.05409443 3.07151826 3.07151826 4.128565 4.128565 4.128565 4.128565
  circle A1 centre (-173.423564, 173.187828) radius 3
  circle A2 centre (173.294495, -173.423564) radius 3
  circle A3 centre (173.241161, 173.241161) radius 3
  circle A4 centre (-173.370231, -173.476898) radius 3
  spline S22 degree 3 poles (-19.066093, -42.869125) (-12.882074, -40.751924) (-6.517551, -39.59928) (6.547635, -39.59651) (12.903023, -40.74369) (19.078711, -42.861037) knots 0 0 0 0 1.96092247 1.96092247 3.91949067 3.91949067 3.91949067 3.91949067 construction
  spline S23 degree 3 poles (19.078711, -42.861037) (14.864666, -45.563042) (10.225957, -47.709734) (1.45827, -49.346262) (-2.32179, -49.284891) (-9.747617, -47.680221) (-14.038512, -46.090792) (-19.066093, -42.869125) knots 0 0 0 0 1.5017693 1.5017693 2.66720704 2.66720704 3.77054668 3.77054668 3.77054668 3.77054668
  spline S24 degree 3 poles (-14.516561, -32.673383) (-12.636802, -28.474571) (-10.750685, -24.278615) (-6.966619, -15.894413) (-5.068682, -11.706181) (-3.164387, -7.520833) knots 0 0 0 0 1.38011477 1.38011477 2.75957612 2.75957612 2.75957612 2.75957612 construction
  arc A5 (-3.164387, -7.520833) -> (3.168342, -7.463715) centre (-0.064535, -0.117868) ccw
  spline S25 degree 3 poles (3.168342, -7.463715) (5.085541, -11.667908) (6.995965, -15.875184) (10.800733, -24.290442) (12.69509, -28.498407) (14.582623, -32.709436) knots 0 0 0 0 1.38621048 1.38621048 2.77062343 2.77062343 2.77062343 2.77062343 construction
  spline S26 degree 3 poles (14.582623, -32.709436) (14.13991, -33.096217) (13.662069, -33.486083) (12.716313, -34.222379) (12.21496, -34.593642) (11.712763, -34.945387) knots 0 0 0 0 0.49185835 0.49185835 1 1 1 1
  spline S27 degree 3 poles (11.712763, -34.945387) (9.276978, -32.103289) (6.942538, -29.102251) (3.034739, -23.232824) (1.370156, -20.340004) (0.003694, -17.328259) knots 0 0 0 0 1.12292095 1.12292095 2.11343337 2.11343337 2.11343337 2.11343337 construction
  spline S28 degree 3 poles (0.003694, -17.328259) (-1.356274, -20.333171) (-3.013893, -23.219487) (-6.906842, -29.076217) (-9.233125, -32.070858) (-11.66075, -34.906916) knots 0 0 0 0 0.98950049 0.98950049 2.1113335 2.1113335 2.1113335 2.1113335
  spline S29 degree 3 poles (-11.66075, -34.906916) (-12.164863, -34.554062) (-12.659287, -34.188046) (-13.611319, -33.442296) (-14.069007, -33.063947) (-14.516561, -32.673383) knots 0 0 0 0 0.50881737 0.50881737 1 1 1 1
  line L4 (-35.085094, 0.350302) -> (-35.085094, 49.099838)
  line L5 (-35.085094, 0.350302) -> (-35.085094, -48.281474)
  line L6 (34.855669, -0.000058) -> (34.855669, -48.547874)
  line L7 (34.855669, -0.000058) -> (34.855669, 49.277496)
  arc A6 (34.855669, 49.277496) -> (-35.085094, 49.099838) centre (-0.029639, 15.697104) ccw
  arc A7 (-35.085094, -48.281474) -> (34.855669, -48.547874) centre (0.003694, -17.328259) ccw
  circle A8 centre (-20, -35) radius 2
  line L8 (-277.818739, 0) -> (277.818714, 0)
  line L9 (0, -277.778257) -> (0, 277.778257)
  circle A9 centre (20, -35) radius 2
  circle A10 centre (-20, 35) radius 2
  circle A11 centre (20, 35) radius 2
  arc A12 (28.355669, 7.5) -> (23.355669, 7.5) centre (25.855669, 7.5) ccw
  arc A13 (23.355669, -7.5) -> (28.355669, -7.5) centre (25.855669, -7.5) ccw
  line L10 (28.355669, -7.5) -> (28.355669, 7.5)
  line L11 (23.355669, 7.5) -> (23.355669, -7.5)
  arc A14 (-23.355669, 7.5) -> (-28.355669, 7.5) centre (-25.855669, 7.5) ccw
  arc A15 (-28.355669, -7.5) -> (-23.355669, -7.5) centre (-25.855669, -7.5) ccw
  line L12 (-28.355669, -7.5) -> (-28.355669, 7.5)
  line L13 (-23.355669, 7.5) -> (-23.355669, -7.5)
  line L14 (19.884685, 42.334177) -> (5.5616, 51.719428) construction
  line L15 (5.5616, 51.719428) -> (-5.507512, 51.719428) construction
  line L16 (-5.507512, 51.719428) -> (-19.948357, 42.291714) construction
  spline S30 degree 3 poles (19.884685, 42.334177) (5.5616, 51.719428) (-5.507512, 51.719428) (-19.948357, 42.291714) knots 1 1 1 1 2 2 2 2
  line L17 (19.884685, 42.334177) -> (6.838806, 36.499399) construction
  line L18 (6.838806, 36.499399) -> (-7.484612, 36.499399) construction
  line L19 (-7.484612, 36.499399) -> (-19.948357, 42.291714) construction
  spline S31 degree 3 poles (19.884685, 42.334177) (6.838806, 36.499399) (-7.484612, 36.499399) (-19.948357, 42.291714) knots 1 1 1 1 2 2 2 2
  spline S32 degree 3 poles (-19.948357, -42.291714) (-18.746641, -43.094581) (-16.376096, -44.544624) (-13.501106, -45.983476) (-10.692066, -47.156791) (-8.496008, -47.889736) (-5.805048, -48.565032) (-3.689231, -48.918937) (-1.070138, -49.1397) (1.014806, -49.141741) (3.633449, -48.926153) (5.748573, -48.576507) (8.438356, -47.906787) (10.633281, -47.178527) (13.440795, -46.011363) (16.314211, -44.578944) (18.683547, -43.134298) (19.884685, -42.334177) knots 1.0724773 1.0724773 1.0724773 1.0724773 1.1438362 1.2151951 1.25087454 1.32223344 1.35791289 1.42927178 1.46495123 1.53631013 1.57198957 1.64334847 1.67902792 1.75038681 1.78606626 1.85742515 1.92878405 1.92878405 1.92878405 1.92878405
  line L20 (19.884685, -42.334177) -> (6.838806, -36.499399) construction
  line L21 (6.838806, -36.499399) -> (-7.484612, -36.499399) construction
  line L22 (-7.484612, -36.499399) -> (-19.948357, -42.291714) construction
  spline S33 degree 3 poles (19.884685, -42.334177) (6.838806, -36.499399) (-7.484612, -36.499399) (-19.948357, -42.291714) knots 1 1 1 1 2 2 2 2
  point P0 (0, 0)
  dimension "d0" = 4
  dimension "d3" = 3.5
  dimension "d4" = 12.5
  dimension "d5" = 5
  dimension "d6" = 9
  dimension "d7" = 7.5
sketch "Szkic1 outline for Wyciągnięcie proste1" plane through (0, 0, 0) normal (0, 0, 1) x (1, 0, 0)
  line L0 (-35.085094, 0.350302) -> (-35.085094, 49.099838)
  line L1 (-35.085094, -48.281474) -> (-35.085094, 0.350302)
  arc A0 (-35.085094, 49.099838) -> (34.855669, 49.277496) centre (-0.029639, 15.697104) cw
  arc A1 (34.855669, -48.547874) -> (-35.085094, -48.281474) centre (0.003694, -17.328259) cw
  line L2 (34.855669, 49.277496) -> (34.855669, -0.000058)
  line L3 (34.855669, -0.000058) -> (34.855669, -48.547874)
  circle A2 centre (-20, -35) radius 2
  spline S0 degree 3 poles (19.884685, -42.334177) (6.838806, -36.499399) (-7.484612, -36.499399) (-19.948357, -42.291714) knots 0 0 0 0 1 1 1 1
  spline S1 degree 3 poles (-19.948357, -42.291714) (-18.746641, -43.094581) (-16.376096, -44.544624) (-13.501106, -45.983476) (-10.692066, -47.156791) (-8.496008, -47.889736) (-5.805048, -48.565032) (-3.689231, -48.918937) (-1.070138, -49.1397) (1.014806, -49.141741) (3.633449, -48.926153) (5.748573, -48.576507) (8.438356, -47.906787) (10.633281, -47.178527) (13.440795, -46.011363) (16.314211, -44.578944) (18.683547, -43.134298) (19.884685, -42.334177) knots 0 0 0 0 0.08333333 0.16666667 0.20833333 0.29166667 0.33333333 0.41666667 0.45833333 0.54166667 0.58333333 0.66666667 0.70833333 0.79166667 0.83333333 0.91666667 1 1 1 1
  line L4 (-28.355669, 7.5) -> (-28.355669, -7.5)
  arc A3 (-28.355669, -7.5) -> (-23.355669, -7.5) centre (-25.855669, -7.5) ccw
  line L5 (-23.355669, -7.5) -> (-23.355669, 7.5)
  arc A4 (-23.355669, 7.5) -> (-28.355669, 7.5) centre (-25.855669, 7.5) ccw
  circle A5 centre (20, -35) radius 2
  line L6 (28.355669, 7.5) -> (28.355669, -7.5)
  arc A6 (23.355669, 7.5) -> (28.355669, 7.5) centre (25.855669, 7.5) cw
  line L7 (23.355669, -7.5) -> (23.355669, 7.5)
  arc A7 (28.355669, -7.5) -> (23.355669, -7.5) centre (25.855669, -7.5) cw
  circle A8 centre (-20, 35) radius 2
  spline S2 degree 3 poles (19.884685, 42.334177) (5.5616, 51.719428) (-5.507512, 51.719428) (-19.948357, 42.291714) knots 0 0 0 0 1 1 1 1
  spline S3 degree 3 poles (19.884685, 42.334177) (6.838806, 36.499399) (-7.484612, 36.499399) (-19.948357, 42.291714) knots 0 0 0 0 1 1 1 1
  circle A9 centre (20, 35) radius 2
extrude "Wyciągnięcie proste1" add sketch "Szkic1 outline for Wyciągnięcie proste1" along normal blind 3
sketch "Szkic2" plane through (0, 0, 0) normal (0, 0, -1) x (-1, 0, 0)
  ellipse E0 centre (-36.5599, 0) end of major axis (-43.081778, 0) minor radius 6
  circle A0 centre (-32.044255, 12.339629) radius 2
  circle A1 centre (-32.044255, -12.339629) radius 2
  ellipse E1 centre (36.5599, 0) end of major axis (43.081778, 0) minor radius 6
  circle A2 centre (32.044255, 12.339629) radius 2
  circle A3 centre (32.044255, -12.339629) radius 2
  point P0 (0, 0)
extrude "Wyciągnięcie proste2" cut sketch "Szkic2" against normal through all
sketch "Szkic3" plane through (0, 0, 0) normal (0, 0, -1) x (-1, 0, 0)
  circle A0 centre (-29.855669, -45.12143) radius 1.5
  circle A1 centre (-29.855669, 45.469872) radius 1.5
  circle A2 centre (30.010159, 45.469872) radius 1.5
  circle A3 centre (30.010159, -45.12143) radius 1.5
  point P0 (0, 0)
extrude "Wyciągnięcie proste3" cut sketch "Szkic3" against normal through all
properties part number "płyta_pod_lipol"
